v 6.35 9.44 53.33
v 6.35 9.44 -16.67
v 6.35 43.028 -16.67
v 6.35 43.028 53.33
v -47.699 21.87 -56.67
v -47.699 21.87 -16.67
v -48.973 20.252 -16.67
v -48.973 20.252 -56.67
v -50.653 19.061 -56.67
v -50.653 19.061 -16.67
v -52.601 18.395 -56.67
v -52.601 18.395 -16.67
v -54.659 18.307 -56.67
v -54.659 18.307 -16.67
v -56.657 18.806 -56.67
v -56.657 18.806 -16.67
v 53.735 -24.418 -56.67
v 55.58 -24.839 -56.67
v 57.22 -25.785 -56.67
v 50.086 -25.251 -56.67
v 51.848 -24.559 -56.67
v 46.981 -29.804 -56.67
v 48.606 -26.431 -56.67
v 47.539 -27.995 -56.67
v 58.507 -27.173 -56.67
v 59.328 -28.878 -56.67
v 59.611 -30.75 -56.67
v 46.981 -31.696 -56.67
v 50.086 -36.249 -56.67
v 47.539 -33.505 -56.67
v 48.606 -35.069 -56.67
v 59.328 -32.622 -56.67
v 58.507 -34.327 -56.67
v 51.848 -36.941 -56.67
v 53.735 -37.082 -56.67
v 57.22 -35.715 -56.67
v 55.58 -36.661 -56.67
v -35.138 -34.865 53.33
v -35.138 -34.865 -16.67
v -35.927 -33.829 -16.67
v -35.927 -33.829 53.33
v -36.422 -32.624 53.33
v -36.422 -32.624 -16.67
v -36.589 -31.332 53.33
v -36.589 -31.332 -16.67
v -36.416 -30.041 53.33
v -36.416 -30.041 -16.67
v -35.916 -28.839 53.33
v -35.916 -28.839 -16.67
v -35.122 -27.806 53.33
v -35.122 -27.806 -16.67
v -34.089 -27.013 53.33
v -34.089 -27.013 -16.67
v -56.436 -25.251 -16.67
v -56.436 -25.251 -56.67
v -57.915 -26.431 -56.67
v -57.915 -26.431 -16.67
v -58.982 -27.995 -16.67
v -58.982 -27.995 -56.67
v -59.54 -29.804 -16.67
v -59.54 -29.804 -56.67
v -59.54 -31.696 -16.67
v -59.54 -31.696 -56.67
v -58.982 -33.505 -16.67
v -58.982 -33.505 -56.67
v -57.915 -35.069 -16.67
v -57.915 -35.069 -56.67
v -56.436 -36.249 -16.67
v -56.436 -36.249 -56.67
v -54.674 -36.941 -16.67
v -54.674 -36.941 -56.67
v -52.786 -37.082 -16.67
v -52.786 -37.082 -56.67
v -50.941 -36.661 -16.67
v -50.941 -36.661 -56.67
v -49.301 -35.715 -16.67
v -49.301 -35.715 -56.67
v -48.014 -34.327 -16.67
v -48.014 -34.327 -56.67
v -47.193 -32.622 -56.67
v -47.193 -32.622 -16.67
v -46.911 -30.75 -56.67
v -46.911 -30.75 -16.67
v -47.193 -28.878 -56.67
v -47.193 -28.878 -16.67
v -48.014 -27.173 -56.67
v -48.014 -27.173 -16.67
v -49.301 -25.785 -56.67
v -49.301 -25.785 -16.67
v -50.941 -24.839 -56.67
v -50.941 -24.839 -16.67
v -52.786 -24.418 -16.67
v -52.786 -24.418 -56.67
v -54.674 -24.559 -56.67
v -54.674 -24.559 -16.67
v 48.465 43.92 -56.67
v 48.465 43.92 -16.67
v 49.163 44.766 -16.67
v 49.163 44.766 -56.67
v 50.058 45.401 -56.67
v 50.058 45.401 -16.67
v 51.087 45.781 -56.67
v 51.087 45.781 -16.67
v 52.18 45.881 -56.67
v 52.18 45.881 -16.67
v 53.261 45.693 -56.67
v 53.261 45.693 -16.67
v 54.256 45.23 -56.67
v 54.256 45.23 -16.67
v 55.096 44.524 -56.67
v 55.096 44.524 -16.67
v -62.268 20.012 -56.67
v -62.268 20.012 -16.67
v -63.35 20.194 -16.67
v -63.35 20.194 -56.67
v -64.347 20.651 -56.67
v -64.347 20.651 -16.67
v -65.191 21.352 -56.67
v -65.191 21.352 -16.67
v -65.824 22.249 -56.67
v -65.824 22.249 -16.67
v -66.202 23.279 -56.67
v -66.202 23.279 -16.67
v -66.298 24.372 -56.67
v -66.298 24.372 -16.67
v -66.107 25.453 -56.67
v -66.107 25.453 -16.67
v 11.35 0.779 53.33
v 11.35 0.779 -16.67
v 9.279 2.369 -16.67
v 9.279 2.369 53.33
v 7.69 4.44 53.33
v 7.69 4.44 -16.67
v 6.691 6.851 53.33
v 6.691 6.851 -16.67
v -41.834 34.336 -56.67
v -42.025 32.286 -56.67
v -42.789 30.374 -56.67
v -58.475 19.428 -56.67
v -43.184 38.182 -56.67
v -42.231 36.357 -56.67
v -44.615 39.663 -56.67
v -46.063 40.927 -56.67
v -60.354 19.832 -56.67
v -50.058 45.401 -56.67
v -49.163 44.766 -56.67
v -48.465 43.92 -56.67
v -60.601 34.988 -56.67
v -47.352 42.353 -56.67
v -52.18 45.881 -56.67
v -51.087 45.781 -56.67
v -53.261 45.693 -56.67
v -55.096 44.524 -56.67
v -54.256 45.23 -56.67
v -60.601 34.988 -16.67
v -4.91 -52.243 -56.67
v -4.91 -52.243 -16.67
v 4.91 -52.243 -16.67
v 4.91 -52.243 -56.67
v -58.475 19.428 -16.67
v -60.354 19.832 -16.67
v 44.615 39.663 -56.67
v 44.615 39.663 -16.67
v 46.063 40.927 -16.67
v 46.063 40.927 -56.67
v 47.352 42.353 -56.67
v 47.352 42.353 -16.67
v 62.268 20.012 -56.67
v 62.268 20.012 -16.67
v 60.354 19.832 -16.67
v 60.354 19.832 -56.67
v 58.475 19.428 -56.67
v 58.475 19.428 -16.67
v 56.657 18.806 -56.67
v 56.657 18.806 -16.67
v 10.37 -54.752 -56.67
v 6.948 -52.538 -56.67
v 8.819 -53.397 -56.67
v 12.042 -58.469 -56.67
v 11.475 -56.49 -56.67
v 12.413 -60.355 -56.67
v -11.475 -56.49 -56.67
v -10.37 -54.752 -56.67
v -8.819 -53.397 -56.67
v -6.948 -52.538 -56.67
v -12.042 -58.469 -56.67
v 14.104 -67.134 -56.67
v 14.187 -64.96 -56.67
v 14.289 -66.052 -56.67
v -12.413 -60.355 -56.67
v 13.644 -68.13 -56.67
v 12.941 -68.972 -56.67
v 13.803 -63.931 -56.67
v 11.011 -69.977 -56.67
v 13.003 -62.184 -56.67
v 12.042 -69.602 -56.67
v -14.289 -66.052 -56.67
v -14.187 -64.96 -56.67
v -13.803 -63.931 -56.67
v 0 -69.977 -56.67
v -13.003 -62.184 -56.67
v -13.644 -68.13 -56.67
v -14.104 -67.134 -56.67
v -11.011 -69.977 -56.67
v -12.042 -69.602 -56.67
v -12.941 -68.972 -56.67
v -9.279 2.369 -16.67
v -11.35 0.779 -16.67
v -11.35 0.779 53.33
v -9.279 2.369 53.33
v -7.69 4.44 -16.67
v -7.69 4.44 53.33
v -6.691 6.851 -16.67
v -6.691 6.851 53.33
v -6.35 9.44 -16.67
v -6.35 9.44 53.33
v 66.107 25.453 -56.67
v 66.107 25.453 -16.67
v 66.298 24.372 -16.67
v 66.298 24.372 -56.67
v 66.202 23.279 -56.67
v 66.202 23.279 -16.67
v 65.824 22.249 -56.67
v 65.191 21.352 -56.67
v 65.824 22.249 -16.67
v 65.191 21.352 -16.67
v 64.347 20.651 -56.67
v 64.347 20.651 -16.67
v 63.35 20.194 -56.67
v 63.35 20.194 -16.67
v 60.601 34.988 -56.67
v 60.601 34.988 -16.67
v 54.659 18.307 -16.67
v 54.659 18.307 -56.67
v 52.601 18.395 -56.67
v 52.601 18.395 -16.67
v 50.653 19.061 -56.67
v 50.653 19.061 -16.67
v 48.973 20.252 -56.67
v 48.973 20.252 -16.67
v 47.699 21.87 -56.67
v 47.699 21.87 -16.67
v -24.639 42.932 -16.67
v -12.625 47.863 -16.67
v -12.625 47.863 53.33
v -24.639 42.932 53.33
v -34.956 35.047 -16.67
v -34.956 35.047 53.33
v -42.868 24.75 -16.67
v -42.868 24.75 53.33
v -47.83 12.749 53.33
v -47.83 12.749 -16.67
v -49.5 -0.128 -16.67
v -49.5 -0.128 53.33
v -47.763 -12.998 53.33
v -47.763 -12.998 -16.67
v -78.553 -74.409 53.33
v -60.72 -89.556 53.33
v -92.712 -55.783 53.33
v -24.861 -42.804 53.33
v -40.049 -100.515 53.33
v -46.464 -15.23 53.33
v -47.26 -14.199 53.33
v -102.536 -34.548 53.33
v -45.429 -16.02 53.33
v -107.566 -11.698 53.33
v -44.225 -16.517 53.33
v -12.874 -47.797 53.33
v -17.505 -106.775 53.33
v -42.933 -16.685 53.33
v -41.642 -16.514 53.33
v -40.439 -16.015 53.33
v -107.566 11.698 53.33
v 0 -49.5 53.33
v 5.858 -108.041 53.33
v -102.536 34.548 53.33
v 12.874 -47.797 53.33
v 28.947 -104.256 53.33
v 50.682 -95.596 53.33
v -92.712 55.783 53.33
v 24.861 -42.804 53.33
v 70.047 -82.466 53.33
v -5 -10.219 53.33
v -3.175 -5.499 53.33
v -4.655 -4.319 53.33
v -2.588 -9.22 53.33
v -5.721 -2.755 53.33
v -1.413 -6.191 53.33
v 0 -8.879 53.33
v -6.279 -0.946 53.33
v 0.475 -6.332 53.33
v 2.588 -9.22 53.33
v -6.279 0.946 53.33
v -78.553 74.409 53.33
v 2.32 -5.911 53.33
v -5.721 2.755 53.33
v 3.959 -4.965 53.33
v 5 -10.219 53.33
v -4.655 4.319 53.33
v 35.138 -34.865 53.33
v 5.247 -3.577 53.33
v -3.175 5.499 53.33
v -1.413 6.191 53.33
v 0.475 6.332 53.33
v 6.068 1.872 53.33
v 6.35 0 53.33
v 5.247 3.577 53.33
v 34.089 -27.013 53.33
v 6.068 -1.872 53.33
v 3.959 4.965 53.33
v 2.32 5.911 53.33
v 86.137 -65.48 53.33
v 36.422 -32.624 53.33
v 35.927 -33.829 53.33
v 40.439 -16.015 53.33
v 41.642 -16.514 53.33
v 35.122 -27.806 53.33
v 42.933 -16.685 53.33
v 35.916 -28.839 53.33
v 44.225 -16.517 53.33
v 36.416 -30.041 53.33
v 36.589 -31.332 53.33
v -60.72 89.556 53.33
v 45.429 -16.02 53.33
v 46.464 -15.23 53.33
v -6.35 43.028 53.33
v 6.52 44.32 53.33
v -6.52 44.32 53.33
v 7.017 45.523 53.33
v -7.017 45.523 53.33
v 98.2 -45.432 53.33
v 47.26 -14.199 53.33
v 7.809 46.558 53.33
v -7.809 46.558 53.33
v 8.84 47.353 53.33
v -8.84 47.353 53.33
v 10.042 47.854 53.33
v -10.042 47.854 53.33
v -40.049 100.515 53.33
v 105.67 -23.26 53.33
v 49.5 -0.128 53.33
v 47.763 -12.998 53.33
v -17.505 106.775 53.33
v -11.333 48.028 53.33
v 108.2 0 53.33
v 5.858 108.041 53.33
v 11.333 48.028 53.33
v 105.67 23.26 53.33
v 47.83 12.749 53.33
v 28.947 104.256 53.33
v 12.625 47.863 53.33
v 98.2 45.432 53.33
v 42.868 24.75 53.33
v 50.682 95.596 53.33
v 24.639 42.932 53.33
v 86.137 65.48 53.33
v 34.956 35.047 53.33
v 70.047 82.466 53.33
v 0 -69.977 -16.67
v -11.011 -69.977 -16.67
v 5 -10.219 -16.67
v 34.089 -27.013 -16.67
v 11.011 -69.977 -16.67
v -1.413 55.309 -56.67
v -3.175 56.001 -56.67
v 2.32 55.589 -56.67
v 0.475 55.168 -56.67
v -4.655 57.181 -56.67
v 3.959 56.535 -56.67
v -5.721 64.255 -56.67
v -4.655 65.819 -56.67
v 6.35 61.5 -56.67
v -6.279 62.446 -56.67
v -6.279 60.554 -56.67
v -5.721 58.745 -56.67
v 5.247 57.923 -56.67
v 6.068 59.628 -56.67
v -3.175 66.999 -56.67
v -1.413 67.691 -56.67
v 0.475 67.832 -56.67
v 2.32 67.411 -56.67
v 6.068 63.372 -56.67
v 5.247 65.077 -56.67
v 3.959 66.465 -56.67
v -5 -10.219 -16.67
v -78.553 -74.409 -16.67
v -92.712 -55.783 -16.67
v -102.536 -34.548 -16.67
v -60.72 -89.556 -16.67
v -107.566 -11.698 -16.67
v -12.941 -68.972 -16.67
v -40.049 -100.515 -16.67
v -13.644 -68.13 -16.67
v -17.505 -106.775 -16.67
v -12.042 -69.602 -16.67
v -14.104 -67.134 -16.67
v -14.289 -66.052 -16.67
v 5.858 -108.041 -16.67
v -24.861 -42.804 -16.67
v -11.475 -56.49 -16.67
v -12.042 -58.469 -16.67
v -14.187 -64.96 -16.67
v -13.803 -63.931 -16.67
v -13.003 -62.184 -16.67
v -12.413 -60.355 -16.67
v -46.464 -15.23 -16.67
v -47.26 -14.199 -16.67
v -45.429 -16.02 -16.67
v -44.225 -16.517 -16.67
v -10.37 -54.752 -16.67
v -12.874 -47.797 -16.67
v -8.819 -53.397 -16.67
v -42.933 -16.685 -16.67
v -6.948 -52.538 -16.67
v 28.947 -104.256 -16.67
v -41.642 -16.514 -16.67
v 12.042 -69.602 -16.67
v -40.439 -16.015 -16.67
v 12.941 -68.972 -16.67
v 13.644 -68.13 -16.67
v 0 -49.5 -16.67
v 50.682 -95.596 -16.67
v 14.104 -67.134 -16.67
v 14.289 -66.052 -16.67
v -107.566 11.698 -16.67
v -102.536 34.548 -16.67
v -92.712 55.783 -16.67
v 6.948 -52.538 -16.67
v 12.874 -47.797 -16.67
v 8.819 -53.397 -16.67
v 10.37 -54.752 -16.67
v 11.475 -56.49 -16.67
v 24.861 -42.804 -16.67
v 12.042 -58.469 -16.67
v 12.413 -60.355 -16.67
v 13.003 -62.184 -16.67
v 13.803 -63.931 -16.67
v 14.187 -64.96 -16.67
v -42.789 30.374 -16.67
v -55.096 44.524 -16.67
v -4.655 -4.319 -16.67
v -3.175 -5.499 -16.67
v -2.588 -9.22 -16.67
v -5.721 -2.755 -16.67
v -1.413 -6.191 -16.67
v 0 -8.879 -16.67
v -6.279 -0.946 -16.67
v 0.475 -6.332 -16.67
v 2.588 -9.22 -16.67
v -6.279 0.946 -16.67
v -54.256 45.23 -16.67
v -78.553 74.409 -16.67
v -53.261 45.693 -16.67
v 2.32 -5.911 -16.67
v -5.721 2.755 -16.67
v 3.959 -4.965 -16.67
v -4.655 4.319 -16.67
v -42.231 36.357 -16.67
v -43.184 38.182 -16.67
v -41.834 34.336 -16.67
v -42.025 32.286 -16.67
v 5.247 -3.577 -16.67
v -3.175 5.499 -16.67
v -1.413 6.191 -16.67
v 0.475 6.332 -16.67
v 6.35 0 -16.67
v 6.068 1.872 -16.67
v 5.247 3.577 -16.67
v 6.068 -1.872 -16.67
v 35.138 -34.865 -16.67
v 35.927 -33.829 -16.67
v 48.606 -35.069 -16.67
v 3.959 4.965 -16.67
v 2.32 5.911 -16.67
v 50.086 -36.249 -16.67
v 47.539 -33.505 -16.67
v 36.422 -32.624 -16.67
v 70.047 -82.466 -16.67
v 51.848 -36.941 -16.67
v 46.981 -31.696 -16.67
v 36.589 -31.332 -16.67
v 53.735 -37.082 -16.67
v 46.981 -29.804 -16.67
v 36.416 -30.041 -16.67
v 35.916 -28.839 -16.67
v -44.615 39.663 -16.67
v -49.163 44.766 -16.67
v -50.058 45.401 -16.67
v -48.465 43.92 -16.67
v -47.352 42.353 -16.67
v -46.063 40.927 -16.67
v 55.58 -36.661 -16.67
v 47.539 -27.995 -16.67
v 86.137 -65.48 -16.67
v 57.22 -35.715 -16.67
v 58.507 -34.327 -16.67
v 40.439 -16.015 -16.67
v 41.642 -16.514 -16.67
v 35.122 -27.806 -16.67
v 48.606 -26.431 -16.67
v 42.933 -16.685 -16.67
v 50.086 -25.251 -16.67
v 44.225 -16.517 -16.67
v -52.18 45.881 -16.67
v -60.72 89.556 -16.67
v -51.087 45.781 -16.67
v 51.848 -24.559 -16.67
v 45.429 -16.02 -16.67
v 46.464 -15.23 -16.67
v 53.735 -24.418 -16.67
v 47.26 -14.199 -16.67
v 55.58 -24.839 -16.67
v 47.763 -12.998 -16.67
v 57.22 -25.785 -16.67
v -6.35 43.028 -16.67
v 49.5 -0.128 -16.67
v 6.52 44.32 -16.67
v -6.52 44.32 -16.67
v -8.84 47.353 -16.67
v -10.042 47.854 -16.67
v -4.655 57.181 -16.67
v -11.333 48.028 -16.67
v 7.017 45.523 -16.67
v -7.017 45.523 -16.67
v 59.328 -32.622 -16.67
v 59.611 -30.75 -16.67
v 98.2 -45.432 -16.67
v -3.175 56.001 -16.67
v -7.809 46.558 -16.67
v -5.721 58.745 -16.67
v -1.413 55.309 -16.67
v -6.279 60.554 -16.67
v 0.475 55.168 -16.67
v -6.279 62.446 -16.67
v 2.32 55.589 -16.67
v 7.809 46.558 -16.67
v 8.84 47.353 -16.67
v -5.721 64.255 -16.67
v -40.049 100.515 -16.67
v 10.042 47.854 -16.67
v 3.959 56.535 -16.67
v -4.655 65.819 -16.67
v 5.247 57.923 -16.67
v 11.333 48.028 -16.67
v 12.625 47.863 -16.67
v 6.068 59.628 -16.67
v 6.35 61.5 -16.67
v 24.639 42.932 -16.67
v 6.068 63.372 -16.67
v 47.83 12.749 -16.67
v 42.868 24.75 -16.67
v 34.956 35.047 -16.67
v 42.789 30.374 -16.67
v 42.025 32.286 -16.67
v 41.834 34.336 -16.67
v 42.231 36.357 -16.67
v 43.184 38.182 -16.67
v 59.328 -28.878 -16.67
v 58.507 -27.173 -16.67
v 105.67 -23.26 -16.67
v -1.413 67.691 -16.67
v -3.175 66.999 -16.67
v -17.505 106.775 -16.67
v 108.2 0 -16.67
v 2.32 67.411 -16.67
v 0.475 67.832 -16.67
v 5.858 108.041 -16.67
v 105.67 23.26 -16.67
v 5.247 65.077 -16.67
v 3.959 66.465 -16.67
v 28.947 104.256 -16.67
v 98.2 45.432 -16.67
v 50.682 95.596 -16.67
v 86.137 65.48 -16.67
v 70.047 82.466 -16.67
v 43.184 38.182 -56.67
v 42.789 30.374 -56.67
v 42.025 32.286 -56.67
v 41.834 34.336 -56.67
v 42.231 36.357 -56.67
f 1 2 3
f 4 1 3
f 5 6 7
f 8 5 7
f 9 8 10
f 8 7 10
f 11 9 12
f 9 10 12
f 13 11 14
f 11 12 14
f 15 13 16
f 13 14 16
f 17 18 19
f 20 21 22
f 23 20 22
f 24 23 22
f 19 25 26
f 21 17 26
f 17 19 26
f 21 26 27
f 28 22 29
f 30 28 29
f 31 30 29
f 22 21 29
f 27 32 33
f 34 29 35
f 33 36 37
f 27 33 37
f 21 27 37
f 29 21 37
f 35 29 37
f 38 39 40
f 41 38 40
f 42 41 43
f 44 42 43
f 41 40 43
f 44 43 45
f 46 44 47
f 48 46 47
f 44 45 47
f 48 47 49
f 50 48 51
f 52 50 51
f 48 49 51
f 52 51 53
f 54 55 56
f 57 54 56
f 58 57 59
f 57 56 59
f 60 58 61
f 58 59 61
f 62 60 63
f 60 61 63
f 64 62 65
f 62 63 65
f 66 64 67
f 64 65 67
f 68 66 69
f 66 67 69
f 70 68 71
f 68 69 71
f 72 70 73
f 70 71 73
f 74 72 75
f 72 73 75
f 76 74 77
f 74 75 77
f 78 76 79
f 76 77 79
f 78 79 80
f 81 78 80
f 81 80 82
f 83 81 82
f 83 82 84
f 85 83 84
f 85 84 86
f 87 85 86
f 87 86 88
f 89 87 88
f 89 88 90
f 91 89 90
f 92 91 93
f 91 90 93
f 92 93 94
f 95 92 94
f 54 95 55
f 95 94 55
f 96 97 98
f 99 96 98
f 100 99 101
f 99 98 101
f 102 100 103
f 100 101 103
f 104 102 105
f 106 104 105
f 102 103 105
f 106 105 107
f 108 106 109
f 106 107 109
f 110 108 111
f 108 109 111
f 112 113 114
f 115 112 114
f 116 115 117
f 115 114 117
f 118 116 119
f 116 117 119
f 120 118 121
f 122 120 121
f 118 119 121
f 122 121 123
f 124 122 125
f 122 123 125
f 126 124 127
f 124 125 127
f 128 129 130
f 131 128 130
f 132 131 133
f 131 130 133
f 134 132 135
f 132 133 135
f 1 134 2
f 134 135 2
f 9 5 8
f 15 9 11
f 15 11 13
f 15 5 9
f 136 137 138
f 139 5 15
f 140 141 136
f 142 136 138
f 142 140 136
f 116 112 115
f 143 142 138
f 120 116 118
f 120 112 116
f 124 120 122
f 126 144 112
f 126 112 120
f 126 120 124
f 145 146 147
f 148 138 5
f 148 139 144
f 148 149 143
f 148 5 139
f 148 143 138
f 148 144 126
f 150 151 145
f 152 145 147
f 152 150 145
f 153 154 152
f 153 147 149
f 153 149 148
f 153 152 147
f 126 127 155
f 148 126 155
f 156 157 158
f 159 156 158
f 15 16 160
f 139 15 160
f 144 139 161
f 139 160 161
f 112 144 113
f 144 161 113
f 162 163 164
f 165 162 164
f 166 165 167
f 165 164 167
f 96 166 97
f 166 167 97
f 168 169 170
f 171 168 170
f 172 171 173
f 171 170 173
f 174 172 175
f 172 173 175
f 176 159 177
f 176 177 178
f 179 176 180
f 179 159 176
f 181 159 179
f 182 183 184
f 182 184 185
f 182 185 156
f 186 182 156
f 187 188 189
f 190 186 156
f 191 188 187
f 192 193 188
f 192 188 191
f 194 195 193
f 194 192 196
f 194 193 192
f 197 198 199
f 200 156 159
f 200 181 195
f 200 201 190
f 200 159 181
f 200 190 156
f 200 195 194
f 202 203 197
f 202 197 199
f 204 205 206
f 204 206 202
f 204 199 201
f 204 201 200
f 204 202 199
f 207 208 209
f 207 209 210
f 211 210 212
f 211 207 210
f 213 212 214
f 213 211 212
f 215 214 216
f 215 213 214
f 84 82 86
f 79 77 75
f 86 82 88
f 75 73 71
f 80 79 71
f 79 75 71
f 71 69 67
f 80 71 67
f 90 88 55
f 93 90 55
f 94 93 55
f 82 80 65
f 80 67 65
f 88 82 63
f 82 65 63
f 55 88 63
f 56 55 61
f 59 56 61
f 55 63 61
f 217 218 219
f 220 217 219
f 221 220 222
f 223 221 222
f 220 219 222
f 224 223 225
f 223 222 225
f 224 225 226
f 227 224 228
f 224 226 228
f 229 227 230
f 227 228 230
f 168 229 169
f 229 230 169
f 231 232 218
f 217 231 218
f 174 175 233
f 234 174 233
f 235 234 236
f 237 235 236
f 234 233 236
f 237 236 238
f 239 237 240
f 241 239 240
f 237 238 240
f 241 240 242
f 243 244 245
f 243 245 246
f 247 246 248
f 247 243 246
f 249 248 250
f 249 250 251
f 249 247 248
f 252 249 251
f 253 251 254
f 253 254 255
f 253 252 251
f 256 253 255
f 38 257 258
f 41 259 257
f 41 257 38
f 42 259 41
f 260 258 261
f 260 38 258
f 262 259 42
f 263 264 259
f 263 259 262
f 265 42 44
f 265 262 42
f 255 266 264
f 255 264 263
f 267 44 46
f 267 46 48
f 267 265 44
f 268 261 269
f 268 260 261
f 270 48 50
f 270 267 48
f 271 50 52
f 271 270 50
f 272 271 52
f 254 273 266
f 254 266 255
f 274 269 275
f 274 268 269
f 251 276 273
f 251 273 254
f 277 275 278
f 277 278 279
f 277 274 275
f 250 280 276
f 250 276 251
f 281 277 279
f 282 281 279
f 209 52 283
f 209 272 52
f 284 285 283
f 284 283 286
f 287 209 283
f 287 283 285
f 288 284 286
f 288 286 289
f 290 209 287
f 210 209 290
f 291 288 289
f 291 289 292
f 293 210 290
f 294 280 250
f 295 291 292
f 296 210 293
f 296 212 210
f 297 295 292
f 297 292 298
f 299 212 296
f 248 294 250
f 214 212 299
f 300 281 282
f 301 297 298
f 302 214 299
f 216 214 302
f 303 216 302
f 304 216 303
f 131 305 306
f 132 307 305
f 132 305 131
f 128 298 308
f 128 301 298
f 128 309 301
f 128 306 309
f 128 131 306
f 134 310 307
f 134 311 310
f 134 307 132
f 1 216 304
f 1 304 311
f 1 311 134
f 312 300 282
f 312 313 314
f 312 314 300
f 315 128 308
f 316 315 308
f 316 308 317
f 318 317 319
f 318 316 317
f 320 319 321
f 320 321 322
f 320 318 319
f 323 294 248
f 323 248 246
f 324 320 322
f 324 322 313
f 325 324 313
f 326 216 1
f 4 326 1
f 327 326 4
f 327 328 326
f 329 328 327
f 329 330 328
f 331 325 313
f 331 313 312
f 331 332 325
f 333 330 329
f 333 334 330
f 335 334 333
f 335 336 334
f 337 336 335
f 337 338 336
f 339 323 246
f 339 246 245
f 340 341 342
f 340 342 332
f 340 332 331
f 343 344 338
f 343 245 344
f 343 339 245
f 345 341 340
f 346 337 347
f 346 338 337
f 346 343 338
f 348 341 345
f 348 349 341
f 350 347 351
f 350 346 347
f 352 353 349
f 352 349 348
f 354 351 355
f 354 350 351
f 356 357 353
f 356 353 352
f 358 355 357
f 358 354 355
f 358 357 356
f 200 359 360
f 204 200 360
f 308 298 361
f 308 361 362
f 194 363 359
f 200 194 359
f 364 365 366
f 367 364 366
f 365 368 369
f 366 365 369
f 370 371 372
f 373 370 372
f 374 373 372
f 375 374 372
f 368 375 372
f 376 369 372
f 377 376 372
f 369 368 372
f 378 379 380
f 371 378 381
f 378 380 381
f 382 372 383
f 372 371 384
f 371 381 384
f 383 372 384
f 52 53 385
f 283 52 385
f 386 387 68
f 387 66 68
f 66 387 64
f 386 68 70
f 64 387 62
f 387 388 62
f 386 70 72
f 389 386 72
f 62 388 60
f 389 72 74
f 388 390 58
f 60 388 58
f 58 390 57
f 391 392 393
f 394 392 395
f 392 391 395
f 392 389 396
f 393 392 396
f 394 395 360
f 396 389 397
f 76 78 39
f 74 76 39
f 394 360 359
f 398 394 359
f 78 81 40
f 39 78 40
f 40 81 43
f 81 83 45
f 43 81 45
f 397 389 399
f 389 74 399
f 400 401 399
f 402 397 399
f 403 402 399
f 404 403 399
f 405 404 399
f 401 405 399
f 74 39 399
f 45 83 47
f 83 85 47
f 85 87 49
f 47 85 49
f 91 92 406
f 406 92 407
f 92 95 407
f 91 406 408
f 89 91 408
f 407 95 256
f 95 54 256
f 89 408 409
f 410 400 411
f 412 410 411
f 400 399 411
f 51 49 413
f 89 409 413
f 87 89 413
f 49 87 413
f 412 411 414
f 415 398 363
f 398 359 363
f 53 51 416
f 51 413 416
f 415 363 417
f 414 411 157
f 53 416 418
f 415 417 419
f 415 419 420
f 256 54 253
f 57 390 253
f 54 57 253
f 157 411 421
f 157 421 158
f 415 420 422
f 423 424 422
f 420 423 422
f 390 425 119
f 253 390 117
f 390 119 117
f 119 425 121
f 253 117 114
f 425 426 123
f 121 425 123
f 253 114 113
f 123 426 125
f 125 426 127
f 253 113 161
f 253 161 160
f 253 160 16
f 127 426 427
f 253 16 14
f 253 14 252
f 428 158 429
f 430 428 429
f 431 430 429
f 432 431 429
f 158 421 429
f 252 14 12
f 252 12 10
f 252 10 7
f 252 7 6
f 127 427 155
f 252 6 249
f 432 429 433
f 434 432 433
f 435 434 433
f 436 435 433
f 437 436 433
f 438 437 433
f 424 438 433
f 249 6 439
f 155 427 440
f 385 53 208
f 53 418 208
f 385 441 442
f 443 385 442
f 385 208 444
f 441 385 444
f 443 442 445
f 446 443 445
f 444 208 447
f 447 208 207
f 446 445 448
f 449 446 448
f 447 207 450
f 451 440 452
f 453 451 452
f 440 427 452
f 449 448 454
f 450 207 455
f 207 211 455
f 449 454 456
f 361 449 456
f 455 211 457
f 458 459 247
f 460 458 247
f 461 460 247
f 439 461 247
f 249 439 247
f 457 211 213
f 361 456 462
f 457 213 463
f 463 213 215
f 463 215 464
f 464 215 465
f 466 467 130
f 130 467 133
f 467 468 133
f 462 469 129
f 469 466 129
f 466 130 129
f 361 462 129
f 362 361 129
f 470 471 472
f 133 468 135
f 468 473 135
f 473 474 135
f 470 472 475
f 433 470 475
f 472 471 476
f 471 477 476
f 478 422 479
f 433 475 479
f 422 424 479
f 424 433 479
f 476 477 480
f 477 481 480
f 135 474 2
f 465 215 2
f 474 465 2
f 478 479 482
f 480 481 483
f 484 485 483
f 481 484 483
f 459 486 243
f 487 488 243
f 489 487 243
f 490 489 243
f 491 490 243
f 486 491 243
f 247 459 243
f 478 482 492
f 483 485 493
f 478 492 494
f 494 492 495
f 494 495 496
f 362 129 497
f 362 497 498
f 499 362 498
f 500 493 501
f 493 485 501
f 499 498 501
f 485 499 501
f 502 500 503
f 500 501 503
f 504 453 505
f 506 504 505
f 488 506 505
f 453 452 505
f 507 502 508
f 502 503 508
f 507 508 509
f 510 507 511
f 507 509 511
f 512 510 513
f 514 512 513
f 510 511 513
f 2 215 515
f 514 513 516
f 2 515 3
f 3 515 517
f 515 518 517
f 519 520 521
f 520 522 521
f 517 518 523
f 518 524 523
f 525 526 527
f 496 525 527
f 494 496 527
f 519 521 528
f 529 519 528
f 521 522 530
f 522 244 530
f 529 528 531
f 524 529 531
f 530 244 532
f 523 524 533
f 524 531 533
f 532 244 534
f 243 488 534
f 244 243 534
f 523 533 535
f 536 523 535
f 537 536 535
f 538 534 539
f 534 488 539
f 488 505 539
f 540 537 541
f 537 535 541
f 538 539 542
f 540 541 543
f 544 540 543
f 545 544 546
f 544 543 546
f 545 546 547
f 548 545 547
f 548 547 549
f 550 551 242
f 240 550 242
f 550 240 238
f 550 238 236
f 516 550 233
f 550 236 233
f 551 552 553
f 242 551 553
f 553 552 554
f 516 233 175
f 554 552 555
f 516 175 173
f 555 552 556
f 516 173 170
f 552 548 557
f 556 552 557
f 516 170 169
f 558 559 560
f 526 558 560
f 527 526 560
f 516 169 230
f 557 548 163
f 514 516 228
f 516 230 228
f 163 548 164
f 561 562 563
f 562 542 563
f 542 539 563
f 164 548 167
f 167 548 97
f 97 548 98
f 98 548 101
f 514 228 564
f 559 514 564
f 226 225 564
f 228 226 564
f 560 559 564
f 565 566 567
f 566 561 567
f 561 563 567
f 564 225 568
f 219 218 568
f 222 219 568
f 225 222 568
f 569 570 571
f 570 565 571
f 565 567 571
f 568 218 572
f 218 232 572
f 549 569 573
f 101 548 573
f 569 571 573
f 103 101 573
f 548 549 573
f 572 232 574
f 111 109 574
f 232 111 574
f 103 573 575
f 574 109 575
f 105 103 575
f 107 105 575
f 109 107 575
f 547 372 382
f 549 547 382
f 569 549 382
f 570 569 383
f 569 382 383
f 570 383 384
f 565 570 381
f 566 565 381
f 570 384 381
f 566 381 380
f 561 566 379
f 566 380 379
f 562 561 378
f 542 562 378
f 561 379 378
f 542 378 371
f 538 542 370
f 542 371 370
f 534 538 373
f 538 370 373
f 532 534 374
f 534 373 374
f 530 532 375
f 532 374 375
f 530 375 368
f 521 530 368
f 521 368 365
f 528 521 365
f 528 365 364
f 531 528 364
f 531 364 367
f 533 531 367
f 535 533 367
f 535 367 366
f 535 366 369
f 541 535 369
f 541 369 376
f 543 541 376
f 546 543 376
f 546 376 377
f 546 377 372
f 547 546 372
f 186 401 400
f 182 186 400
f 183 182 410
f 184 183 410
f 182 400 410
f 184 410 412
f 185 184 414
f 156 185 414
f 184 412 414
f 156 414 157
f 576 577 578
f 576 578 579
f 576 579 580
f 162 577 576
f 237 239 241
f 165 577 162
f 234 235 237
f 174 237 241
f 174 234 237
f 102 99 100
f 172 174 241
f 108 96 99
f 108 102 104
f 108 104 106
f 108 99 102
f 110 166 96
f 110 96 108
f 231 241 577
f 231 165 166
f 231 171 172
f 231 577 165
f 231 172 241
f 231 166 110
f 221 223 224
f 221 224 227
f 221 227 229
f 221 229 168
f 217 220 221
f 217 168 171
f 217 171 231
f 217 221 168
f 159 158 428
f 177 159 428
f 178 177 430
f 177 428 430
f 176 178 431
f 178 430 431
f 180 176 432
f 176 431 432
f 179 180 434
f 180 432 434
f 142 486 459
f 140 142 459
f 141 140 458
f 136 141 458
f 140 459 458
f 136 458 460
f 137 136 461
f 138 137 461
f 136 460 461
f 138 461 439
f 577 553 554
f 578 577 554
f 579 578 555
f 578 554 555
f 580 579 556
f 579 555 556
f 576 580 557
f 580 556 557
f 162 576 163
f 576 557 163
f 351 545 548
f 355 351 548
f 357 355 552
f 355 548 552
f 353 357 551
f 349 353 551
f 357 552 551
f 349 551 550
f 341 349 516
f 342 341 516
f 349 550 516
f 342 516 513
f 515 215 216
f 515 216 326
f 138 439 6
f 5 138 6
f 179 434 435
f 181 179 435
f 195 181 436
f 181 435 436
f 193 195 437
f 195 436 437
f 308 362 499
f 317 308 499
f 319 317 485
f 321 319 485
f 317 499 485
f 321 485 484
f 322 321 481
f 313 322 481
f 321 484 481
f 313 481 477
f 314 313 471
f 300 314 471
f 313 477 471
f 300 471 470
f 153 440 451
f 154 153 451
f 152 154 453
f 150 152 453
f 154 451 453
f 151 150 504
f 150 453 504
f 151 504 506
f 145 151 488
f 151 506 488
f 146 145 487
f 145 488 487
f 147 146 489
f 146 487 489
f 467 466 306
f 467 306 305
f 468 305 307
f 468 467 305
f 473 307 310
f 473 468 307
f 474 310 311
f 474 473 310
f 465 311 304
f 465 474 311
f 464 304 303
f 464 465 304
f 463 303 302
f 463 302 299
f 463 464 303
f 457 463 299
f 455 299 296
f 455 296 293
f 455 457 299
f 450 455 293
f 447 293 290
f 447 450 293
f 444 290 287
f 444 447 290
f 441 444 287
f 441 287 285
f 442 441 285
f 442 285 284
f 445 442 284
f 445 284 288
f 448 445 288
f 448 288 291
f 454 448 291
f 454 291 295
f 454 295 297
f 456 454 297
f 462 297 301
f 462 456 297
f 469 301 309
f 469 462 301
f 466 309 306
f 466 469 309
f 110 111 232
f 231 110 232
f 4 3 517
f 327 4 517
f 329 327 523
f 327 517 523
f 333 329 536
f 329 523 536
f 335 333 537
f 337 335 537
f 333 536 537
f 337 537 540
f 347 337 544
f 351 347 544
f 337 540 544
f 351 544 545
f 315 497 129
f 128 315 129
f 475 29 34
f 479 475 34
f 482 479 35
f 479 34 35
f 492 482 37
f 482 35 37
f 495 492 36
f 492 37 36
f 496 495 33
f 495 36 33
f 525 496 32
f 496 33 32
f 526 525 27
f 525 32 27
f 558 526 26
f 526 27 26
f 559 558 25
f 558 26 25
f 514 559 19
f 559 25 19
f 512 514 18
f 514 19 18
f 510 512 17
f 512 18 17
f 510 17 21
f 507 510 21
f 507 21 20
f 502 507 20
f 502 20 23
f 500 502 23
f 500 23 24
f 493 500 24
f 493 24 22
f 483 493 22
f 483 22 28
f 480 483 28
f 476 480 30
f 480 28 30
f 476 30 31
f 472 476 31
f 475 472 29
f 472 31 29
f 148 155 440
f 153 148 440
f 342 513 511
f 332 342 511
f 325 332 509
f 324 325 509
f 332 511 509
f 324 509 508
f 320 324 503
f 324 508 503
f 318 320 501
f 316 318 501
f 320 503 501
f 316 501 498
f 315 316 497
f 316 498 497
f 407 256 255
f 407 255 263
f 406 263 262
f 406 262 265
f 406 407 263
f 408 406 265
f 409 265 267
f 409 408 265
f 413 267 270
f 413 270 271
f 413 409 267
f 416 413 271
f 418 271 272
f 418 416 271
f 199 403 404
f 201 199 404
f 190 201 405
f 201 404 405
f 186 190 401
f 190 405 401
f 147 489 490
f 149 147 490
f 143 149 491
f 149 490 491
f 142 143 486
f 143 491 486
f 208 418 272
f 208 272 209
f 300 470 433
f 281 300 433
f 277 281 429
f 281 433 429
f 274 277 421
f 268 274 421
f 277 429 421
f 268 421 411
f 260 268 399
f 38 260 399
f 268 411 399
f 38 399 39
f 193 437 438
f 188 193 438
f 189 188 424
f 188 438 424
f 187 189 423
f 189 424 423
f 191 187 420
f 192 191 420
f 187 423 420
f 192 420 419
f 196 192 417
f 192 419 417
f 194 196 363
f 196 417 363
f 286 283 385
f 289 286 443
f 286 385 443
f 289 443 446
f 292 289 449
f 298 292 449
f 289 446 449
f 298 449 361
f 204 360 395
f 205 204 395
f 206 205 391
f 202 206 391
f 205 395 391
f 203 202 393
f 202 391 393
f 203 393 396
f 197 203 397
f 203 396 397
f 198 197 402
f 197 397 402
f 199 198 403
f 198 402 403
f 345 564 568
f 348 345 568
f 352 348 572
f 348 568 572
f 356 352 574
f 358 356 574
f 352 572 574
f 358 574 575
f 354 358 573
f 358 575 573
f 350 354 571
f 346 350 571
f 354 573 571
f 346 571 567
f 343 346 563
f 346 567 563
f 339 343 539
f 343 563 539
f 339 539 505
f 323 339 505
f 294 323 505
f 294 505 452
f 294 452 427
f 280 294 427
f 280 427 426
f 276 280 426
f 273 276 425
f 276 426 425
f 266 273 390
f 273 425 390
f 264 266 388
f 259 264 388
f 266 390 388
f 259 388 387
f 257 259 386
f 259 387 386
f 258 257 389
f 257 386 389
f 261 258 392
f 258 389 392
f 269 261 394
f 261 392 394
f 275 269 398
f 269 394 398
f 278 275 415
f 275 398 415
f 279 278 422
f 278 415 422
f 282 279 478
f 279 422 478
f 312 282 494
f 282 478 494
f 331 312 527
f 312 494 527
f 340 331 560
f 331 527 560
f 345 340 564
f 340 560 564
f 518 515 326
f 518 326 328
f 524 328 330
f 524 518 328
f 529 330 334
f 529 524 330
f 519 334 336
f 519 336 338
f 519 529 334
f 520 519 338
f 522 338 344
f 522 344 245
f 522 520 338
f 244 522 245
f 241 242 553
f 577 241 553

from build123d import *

# Parameters (mm, degrees)
SKETCH1_R                    = 54.1
SKETCH1_R_2                  = 3.175
BOSS_EXTRUDE1_DEPTH          = 35
BOSS_EXTRU_3_START           = -35
BOSS_EXTRU_3_DEPTH           = 20
R_P_TITION_CIRCULAIRE3_COUNT = 3
BOSS_EXTRU_4_START           = -55
ESQUISSE3_R                  = 3.175
BOSS_EXTRU_4_DEPTH           = 55
R_P_TITION_CIRCULAIRE4_COUNT = 3
ECHELLE1_SCALE               = 2


with BuildPart() as part:
    # Sketch1 → Boss-Extrude1 (new body)
    with BuildSketch(Plane.XY):
        Circle(SKETCH1_R)
        with Locations((0, 30.75)):
            Circle(SKETCH1_R_2, mode=Mode.SUBTRACT)
        with Locations((26.630281166, -15.375)):
            Circle(SKETCH1_R_2, mode=Mode.SUBTRACT)
        with Locations((-26.630281166, -15.375)):
            Circle(SKETCH1_R_2, mode=Mode.SUBTRACT)
        Circle(SKETCH1_R_2, mode=Mode.SUBTRACT)
        with BuildLine():
            Line((-3.175, 4.719838451), (-3.175, 21.514108743))
            ThreePointArc((-3.175, 21.514108743), (-4.149238079, 23.494525508), (-6.312640449, 23.931424332))
            ThreePointArc((-6.312640449, 23.931424332), (-21.434128744, 12.375), (-23.881541645, -6.498805172))
            ThreePointArc((-23.881541645, -6.498805172), (-22.421474979, -8.153917171), (-20.219264711, -8.007423714))
            Line((-20.219264711, -8.007423714), (-5.675, 0.389711432))
            ThreePointArc((-5.675, 0.389711432), (-3.844872981, 2.219838451), (-3.175, 4.719838451))
        make_face(mode=Mode.SUBTRACT)
        with BuildLine():
            Line((3.175, 4.719838451), (3.175, 21.514108743))
            ThreePointArc((3.175, 21.514108743), (4.149238079, 23.494525508), (6.312640449, 23.931424332))
            ThreePointArc((6.312640449, 23.931424332), (21.434128744, 12.375), (23.881541645, -6.498805172))
            ThreePointArc((23.881541645, -6.498805172), (22.421474979, -8.153917171), (20.219264711, -8.007423714))
            Line((20.219264711, -8.007423714), (5.675, 0.389711432))
            ThreePointArc((5.675, 0.389711432), (3.844872981, 2.219838451), (3.175, 4.719838451))
        make_face(mode=Mode.SUBTRACT)
        with BuildLine():
            Line((2.5, -5.109549882), (17.044264711, -13.506685028))
            ThreePointArc((17.044264711, -13.506685028), (18.2722369, -15.340608337), (17.568901196, -17.43261916))
            ThreePointArc((17.568901196, -17.43261916), (0, -24.75), (-17.568901196, -17.43261916))
            ThreePointArc((-17.568901196, -17.43261916), (-18.2722369, -15.340608337), (-17.044264711, -13.506685028))
            Line((-17.044264711, -13.506685028), (-2.5, -5.109549882))
            ThreePointArc((-2.5, -5.109549882), (0, -4.439676901), (2.5, -5.109549882))
        make_face(mode=Mode.SUBTRACT)
    extrude(amount=BOSS_EXTRUDE1_DEPTH)

    # Esquisse1 → Boss.-Extru.3 (add)
    with BuildSketch(Plane.XY.offset(35).offset(BOSS_EXTRU_3_START)):
        with BuildLine():
            Line((-21.394470874, 15.186776811), (-23.849369957, 10.934766872))
            ThreePointArc((-23.849369957, 10.934766872), (-25.80163538, 9.32891658), (-28.328409714, 9.4031251))
            ThreePointArc((-28.328409714, 9.4031251), (-29.704475683, 9.828675415), (-31.133898102, 10.005881992))
            ThreePointArc((-31.133898102, 10.005881992), (-32.768655428, 10.889813252), (-33.053443696, 12.726294025))
            Line((-33.053443696, 12.726294025), (-30.300729733, 17.494134468))
            Line((-30.300729733, 17.494134468), (-27.548015769, 22.261974911))
            ThreePointArc((-27.548015769, 22.261974911), (-25.815182633, 22.933581423), (-24.232297044, 21.959805679))
            ThreePointArc((-24.232297044, 21.959805679), (-23.364120437, 20.81049284), (-22.307550068, 19.831559912))
            ThreePointArc((-22.307550068, 19.831559912), (-20.979896438, 17.680413408), (-21.394470874, 15.186776811))
        make_face()
    boss_extru_3 = extrude(amount=-BOSS_EXTRU_3_DEPTH)

    # Répétition circulaire3: Boss.-Extru.3 ×3 about axis
    r_p_tition_circulaire3_axis = Axis((0, 0, 0), (0, 0, 1))
    for i in range(1, R_P_TITION_CIRCULAIRE3_COUNT):
        add(boss_extru_3.rotate(r_p_tition_circulaire3_axis, i * 360 / R_P_TITION_CIRCULAIRE3_COUNT))

    # Esquisse3 → Boss.-Extru.4 (add)
    with BuildSketch(Plane.XY.offset(35).offset(BOSS_EXTRU_4_START)):
        with Locations((0, 30.75)):
            Circle(ESQUISSE3_R)
    boss_extru_4 = extrude(amount=BOSS_EXTRU_4_DEPTH)

    # Répétition circulaire4: Boss.-Extru.4 ×3 about axis
    r_p_tition_circulaire4_axis = Axis((0, 0, 0), (0, 0, 1))
    for i in range(1, R_P_TITION_CIRCULAIRE4_COUNT):
        add(boss_extru_4.rotate(r_p_tition_circulaire4_axis, i * 360 / R_P_TITION_CIRCULAIRE4_COUNT))


with BuildPart() as part_1:
    # Echelle1: scaled about (0, 0, 16.669882878)
    add(part.part.scale(ECHELLE1_SCALE).moved(Location((0, 0, -16.669882878))))


solid = part_1.part
